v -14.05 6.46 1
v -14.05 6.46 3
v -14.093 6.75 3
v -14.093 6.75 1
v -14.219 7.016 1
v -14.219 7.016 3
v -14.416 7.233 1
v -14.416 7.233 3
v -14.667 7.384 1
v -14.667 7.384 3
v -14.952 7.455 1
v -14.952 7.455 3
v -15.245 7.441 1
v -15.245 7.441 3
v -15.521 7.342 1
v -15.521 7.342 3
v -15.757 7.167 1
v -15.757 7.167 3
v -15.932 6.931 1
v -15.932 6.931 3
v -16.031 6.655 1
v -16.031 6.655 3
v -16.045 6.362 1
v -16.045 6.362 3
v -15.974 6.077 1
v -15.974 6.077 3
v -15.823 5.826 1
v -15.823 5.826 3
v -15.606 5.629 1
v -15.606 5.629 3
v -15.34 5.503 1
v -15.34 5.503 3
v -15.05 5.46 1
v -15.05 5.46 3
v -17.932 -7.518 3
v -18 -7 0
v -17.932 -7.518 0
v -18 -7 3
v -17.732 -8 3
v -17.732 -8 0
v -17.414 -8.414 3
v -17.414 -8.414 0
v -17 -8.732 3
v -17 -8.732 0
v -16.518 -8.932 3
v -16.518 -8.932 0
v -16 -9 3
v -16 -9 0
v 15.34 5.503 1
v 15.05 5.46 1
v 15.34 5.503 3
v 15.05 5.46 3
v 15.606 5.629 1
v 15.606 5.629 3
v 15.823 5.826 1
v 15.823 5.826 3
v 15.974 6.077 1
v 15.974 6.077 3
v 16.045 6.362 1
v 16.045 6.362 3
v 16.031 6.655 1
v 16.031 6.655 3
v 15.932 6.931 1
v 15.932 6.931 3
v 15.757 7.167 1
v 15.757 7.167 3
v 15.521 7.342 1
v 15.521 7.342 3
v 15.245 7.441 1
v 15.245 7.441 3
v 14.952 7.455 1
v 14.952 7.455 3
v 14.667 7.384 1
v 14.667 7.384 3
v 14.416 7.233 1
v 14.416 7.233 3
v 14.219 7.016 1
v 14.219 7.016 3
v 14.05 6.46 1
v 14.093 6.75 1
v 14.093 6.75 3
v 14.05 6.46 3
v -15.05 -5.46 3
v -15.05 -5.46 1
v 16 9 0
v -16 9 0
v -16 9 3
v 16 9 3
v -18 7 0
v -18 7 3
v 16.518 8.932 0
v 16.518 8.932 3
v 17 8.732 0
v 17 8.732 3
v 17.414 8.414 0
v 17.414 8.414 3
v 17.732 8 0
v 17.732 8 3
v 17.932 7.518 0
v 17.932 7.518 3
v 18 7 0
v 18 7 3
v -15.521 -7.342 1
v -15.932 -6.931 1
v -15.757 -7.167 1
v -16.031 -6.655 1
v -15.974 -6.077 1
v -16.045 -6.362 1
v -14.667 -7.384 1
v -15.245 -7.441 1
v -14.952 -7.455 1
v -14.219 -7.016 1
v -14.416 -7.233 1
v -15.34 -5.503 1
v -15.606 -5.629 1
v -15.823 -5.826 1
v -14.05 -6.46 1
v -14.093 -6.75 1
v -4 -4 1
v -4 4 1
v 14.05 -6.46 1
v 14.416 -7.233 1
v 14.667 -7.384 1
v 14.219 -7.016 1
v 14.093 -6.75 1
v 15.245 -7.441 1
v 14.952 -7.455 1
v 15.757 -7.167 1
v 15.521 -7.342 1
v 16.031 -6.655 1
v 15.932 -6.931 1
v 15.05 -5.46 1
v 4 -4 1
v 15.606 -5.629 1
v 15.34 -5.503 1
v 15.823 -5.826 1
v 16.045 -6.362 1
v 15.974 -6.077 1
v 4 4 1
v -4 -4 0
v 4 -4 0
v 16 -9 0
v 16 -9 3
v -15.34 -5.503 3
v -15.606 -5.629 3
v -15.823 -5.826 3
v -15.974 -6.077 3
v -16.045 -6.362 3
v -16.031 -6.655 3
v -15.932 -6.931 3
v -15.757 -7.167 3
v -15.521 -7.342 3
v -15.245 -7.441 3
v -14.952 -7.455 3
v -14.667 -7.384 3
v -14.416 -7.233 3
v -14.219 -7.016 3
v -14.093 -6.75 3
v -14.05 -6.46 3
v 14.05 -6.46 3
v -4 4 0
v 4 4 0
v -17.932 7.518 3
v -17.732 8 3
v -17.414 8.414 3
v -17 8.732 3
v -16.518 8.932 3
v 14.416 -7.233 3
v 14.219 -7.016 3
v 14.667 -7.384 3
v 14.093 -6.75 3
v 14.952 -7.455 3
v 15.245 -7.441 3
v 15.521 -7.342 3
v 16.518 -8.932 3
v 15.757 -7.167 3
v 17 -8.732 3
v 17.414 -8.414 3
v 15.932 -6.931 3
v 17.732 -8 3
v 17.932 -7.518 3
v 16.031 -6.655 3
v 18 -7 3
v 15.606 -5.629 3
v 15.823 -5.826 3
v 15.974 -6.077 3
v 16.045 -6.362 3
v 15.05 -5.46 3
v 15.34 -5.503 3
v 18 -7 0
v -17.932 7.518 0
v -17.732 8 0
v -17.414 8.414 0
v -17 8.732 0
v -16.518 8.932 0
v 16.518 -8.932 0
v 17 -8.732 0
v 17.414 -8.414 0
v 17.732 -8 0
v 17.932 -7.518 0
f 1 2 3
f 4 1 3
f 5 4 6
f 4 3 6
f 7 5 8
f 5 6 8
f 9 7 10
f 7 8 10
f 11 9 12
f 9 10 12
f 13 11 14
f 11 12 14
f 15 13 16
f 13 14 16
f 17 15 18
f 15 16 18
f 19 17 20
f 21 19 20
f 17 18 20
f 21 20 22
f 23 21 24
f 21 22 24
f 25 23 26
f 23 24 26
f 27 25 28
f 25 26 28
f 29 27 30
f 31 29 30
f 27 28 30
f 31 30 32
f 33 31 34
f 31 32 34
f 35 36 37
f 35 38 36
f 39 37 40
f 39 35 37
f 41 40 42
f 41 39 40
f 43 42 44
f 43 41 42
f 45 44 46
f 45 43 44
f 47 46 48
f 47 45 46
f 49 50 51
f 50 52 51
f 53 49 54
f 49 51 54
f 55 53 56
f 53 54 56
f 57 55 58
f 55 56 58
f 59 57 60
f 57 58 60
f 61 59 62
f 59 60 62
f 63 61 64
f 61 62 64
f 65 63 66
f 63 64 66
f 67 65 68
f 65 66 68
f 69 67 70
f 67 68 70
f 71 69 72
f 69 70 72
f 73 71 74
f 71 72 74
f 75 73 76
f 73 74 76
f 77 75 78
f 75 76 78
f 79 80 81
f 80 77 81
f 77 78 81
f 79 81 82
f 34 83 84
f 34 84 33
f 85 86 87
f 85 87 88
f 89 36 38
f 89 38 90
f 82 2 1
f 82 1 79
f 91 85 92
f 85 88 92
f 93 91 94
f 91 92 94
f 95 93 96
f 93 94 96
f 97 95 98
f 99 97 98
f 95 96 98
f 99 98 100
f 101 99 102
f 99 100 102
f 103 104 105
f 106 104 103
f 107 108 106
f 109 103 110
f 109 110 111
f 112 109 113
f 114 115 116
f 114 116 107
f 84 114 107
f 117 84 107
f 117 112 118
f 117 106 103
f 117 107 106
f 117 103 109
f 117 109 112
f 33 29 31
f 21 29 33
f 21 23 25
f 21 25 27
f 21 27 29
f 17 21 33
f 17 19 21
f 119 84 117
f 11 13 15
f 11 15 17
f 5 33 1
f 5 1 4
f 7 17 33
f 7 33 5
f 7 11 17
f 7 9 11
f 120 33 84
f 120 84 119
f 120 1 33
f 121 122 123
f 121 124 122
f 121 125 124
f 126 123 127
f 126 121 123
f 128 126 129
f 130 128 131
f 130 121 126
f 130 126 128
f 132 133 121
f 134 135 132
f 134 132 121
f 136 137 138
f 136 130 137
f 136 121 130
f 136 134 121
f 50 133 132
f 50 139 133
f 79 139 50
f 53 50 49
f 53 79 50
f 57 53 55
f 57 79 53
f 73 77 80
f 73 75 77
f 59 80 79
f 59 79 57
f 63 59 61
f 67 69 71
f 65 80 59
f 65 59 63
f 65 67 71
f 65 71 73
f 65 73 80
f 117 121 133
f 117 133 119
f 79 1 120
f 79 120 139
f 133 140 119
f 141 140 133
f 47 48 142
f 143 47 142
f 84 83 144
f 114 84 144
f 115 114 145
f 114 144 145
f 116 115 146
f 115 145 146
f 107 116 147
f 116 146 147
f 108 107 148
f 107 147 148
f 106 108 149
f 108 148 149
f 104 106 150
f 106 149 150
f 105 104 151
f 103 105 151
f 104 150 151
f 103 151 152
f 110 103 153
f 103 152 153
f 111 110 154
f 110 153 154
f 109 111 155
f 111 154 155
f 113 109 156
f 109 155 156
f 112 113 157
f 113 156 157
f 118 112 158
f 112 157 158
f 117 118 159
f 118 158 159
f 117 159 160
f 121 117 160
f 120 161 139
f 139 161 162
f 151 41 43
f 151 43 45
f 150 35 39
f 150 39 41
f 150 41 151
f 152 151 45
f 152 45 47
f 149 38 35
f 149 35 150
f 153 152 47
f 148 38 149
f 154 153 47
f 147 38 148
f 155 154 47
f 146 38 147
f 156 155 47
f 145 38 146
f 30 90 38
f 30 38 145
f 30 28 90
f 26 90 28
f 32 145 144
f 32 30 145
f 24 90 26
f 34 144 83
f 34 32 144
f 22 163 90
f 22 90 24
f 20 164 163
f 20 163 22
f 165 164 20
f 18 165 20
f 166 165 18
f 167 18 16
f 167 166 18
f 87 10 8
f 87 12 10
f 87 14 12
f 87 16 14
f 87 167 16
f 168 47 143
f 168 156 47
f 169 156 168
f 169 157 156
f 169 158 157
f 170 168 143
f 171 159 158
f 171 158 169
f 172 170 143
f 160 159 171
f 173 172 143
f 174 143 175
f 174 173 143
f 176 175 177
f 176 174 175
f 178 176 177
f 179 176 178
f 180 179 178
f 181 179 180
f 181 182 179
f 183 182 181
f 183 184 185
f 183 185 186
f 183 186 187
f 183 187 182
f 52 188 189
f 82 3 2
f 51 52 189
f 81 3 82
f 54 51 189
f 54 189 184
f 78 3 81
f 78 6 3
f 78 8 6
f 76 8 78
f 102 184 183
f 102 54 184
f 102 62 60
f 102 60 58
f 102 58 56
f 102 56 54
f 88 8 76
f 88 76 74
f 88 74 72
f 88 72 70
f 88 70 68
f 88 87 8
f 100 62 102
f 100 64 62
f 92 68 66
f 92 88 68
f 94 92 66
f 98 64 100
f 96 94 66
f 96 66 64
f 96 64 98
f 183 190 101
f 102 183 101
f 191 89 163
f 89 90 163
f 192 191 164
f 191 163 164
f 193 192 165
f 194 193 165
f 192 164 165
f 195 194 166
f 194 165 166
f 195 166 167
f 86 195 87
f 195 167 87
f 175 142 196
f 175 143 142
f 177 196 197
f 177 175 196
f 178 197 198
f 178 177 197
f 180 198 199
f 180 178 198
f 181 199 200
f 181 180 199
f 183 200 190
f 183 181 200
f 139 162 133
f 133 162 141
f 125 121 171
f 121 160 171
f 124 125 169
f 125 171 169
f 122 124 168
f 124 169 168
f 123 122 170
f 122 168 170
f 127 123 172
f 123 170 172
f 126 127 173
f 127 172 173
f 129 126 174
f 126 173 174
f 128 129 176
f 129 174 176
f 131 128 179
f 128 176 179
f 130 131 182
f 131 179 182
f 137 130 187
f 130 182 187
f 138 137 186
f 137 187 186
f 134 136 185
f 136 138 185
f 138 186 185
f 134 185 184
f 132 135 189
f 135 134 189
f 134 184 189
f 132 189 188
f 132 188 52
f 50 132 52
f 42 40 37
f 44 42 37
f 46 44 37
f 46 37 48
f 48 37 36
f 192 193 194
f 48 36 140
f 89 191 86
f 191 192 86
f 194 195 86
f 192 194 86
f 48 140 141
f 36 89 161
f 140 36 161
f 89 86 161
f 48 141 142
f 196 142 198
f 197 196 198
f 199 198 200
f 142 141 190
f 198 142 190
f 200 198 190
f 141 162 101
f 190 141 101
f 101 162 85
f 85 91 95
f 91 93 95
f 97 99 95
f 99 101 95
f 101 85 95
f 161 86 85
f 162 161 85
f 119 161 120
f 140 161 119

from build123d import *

# Parameters (mm, degrees)
F0_W     = 36
F0_H     = 18
F1_DEPTH = 3
F2_W     = 30.1
F2_H     = 12.92
F3_DEPTH = 2
F4_W     = 8
F4_H     = 8
F5_DEPTH = 3.001
F6_R     = 2
F7_R     = 1
F8_DEPTH = 2


with BuildPart() as f1:
    # F0 (on Top) → F1 (new body)
    with BuildSketch(Plane.XY):
        Rectangle(F0_W, F0_H)
    extrude(amount=F1_DEPTH)

    # F2 (on face) → F3 (cut)
    with BuildSketch(Plane.XY.offset(3)):
        Rectangle(F2_W, F2_H)
    extrude(amount=-F3_DEPTH, mode=Mode.SUBTRACT)

    # F4 (on face) → F5 (cut, through all)
    with BuildSketch(Plane(origin=(0, 0, 0), x_dir=(1, 0, 0), z_dir=(0, 0, -1))):
        Rectangle(F4_W, F4_H)
    extrude(amount=-F5_DEPTH, mode=Mode.SUBTRACT)

    # F6
    f6_edges = [f1.edges().sort_by_distance(p)[0] for p in [
        (-18, -9, 1.5),
        (-18, 9, 1.5),
        (18, -9, 1.5),
        (18, 9, 1.5),
    ]]
    fillet(f6_edges, radius=F6_R)

    # F7 (on face) → F8 (cut)
    with BuildSketch(Plane.XY.offset(3)):
        with Locations((-15.05, 6.46)):
            Circle(F7_R)
        with Locations((-15.05, -6.46)):
            Circle(F7_R)
        with Locations((15.05, 6.46)):
            Circle(F7_R)
        with Locations((15.05, -6.46)):
            Circle(F7_R)
    extrude(amount=-F8_DEPTH, mode=Mode.SUBTRACT)


solid = f1.part
